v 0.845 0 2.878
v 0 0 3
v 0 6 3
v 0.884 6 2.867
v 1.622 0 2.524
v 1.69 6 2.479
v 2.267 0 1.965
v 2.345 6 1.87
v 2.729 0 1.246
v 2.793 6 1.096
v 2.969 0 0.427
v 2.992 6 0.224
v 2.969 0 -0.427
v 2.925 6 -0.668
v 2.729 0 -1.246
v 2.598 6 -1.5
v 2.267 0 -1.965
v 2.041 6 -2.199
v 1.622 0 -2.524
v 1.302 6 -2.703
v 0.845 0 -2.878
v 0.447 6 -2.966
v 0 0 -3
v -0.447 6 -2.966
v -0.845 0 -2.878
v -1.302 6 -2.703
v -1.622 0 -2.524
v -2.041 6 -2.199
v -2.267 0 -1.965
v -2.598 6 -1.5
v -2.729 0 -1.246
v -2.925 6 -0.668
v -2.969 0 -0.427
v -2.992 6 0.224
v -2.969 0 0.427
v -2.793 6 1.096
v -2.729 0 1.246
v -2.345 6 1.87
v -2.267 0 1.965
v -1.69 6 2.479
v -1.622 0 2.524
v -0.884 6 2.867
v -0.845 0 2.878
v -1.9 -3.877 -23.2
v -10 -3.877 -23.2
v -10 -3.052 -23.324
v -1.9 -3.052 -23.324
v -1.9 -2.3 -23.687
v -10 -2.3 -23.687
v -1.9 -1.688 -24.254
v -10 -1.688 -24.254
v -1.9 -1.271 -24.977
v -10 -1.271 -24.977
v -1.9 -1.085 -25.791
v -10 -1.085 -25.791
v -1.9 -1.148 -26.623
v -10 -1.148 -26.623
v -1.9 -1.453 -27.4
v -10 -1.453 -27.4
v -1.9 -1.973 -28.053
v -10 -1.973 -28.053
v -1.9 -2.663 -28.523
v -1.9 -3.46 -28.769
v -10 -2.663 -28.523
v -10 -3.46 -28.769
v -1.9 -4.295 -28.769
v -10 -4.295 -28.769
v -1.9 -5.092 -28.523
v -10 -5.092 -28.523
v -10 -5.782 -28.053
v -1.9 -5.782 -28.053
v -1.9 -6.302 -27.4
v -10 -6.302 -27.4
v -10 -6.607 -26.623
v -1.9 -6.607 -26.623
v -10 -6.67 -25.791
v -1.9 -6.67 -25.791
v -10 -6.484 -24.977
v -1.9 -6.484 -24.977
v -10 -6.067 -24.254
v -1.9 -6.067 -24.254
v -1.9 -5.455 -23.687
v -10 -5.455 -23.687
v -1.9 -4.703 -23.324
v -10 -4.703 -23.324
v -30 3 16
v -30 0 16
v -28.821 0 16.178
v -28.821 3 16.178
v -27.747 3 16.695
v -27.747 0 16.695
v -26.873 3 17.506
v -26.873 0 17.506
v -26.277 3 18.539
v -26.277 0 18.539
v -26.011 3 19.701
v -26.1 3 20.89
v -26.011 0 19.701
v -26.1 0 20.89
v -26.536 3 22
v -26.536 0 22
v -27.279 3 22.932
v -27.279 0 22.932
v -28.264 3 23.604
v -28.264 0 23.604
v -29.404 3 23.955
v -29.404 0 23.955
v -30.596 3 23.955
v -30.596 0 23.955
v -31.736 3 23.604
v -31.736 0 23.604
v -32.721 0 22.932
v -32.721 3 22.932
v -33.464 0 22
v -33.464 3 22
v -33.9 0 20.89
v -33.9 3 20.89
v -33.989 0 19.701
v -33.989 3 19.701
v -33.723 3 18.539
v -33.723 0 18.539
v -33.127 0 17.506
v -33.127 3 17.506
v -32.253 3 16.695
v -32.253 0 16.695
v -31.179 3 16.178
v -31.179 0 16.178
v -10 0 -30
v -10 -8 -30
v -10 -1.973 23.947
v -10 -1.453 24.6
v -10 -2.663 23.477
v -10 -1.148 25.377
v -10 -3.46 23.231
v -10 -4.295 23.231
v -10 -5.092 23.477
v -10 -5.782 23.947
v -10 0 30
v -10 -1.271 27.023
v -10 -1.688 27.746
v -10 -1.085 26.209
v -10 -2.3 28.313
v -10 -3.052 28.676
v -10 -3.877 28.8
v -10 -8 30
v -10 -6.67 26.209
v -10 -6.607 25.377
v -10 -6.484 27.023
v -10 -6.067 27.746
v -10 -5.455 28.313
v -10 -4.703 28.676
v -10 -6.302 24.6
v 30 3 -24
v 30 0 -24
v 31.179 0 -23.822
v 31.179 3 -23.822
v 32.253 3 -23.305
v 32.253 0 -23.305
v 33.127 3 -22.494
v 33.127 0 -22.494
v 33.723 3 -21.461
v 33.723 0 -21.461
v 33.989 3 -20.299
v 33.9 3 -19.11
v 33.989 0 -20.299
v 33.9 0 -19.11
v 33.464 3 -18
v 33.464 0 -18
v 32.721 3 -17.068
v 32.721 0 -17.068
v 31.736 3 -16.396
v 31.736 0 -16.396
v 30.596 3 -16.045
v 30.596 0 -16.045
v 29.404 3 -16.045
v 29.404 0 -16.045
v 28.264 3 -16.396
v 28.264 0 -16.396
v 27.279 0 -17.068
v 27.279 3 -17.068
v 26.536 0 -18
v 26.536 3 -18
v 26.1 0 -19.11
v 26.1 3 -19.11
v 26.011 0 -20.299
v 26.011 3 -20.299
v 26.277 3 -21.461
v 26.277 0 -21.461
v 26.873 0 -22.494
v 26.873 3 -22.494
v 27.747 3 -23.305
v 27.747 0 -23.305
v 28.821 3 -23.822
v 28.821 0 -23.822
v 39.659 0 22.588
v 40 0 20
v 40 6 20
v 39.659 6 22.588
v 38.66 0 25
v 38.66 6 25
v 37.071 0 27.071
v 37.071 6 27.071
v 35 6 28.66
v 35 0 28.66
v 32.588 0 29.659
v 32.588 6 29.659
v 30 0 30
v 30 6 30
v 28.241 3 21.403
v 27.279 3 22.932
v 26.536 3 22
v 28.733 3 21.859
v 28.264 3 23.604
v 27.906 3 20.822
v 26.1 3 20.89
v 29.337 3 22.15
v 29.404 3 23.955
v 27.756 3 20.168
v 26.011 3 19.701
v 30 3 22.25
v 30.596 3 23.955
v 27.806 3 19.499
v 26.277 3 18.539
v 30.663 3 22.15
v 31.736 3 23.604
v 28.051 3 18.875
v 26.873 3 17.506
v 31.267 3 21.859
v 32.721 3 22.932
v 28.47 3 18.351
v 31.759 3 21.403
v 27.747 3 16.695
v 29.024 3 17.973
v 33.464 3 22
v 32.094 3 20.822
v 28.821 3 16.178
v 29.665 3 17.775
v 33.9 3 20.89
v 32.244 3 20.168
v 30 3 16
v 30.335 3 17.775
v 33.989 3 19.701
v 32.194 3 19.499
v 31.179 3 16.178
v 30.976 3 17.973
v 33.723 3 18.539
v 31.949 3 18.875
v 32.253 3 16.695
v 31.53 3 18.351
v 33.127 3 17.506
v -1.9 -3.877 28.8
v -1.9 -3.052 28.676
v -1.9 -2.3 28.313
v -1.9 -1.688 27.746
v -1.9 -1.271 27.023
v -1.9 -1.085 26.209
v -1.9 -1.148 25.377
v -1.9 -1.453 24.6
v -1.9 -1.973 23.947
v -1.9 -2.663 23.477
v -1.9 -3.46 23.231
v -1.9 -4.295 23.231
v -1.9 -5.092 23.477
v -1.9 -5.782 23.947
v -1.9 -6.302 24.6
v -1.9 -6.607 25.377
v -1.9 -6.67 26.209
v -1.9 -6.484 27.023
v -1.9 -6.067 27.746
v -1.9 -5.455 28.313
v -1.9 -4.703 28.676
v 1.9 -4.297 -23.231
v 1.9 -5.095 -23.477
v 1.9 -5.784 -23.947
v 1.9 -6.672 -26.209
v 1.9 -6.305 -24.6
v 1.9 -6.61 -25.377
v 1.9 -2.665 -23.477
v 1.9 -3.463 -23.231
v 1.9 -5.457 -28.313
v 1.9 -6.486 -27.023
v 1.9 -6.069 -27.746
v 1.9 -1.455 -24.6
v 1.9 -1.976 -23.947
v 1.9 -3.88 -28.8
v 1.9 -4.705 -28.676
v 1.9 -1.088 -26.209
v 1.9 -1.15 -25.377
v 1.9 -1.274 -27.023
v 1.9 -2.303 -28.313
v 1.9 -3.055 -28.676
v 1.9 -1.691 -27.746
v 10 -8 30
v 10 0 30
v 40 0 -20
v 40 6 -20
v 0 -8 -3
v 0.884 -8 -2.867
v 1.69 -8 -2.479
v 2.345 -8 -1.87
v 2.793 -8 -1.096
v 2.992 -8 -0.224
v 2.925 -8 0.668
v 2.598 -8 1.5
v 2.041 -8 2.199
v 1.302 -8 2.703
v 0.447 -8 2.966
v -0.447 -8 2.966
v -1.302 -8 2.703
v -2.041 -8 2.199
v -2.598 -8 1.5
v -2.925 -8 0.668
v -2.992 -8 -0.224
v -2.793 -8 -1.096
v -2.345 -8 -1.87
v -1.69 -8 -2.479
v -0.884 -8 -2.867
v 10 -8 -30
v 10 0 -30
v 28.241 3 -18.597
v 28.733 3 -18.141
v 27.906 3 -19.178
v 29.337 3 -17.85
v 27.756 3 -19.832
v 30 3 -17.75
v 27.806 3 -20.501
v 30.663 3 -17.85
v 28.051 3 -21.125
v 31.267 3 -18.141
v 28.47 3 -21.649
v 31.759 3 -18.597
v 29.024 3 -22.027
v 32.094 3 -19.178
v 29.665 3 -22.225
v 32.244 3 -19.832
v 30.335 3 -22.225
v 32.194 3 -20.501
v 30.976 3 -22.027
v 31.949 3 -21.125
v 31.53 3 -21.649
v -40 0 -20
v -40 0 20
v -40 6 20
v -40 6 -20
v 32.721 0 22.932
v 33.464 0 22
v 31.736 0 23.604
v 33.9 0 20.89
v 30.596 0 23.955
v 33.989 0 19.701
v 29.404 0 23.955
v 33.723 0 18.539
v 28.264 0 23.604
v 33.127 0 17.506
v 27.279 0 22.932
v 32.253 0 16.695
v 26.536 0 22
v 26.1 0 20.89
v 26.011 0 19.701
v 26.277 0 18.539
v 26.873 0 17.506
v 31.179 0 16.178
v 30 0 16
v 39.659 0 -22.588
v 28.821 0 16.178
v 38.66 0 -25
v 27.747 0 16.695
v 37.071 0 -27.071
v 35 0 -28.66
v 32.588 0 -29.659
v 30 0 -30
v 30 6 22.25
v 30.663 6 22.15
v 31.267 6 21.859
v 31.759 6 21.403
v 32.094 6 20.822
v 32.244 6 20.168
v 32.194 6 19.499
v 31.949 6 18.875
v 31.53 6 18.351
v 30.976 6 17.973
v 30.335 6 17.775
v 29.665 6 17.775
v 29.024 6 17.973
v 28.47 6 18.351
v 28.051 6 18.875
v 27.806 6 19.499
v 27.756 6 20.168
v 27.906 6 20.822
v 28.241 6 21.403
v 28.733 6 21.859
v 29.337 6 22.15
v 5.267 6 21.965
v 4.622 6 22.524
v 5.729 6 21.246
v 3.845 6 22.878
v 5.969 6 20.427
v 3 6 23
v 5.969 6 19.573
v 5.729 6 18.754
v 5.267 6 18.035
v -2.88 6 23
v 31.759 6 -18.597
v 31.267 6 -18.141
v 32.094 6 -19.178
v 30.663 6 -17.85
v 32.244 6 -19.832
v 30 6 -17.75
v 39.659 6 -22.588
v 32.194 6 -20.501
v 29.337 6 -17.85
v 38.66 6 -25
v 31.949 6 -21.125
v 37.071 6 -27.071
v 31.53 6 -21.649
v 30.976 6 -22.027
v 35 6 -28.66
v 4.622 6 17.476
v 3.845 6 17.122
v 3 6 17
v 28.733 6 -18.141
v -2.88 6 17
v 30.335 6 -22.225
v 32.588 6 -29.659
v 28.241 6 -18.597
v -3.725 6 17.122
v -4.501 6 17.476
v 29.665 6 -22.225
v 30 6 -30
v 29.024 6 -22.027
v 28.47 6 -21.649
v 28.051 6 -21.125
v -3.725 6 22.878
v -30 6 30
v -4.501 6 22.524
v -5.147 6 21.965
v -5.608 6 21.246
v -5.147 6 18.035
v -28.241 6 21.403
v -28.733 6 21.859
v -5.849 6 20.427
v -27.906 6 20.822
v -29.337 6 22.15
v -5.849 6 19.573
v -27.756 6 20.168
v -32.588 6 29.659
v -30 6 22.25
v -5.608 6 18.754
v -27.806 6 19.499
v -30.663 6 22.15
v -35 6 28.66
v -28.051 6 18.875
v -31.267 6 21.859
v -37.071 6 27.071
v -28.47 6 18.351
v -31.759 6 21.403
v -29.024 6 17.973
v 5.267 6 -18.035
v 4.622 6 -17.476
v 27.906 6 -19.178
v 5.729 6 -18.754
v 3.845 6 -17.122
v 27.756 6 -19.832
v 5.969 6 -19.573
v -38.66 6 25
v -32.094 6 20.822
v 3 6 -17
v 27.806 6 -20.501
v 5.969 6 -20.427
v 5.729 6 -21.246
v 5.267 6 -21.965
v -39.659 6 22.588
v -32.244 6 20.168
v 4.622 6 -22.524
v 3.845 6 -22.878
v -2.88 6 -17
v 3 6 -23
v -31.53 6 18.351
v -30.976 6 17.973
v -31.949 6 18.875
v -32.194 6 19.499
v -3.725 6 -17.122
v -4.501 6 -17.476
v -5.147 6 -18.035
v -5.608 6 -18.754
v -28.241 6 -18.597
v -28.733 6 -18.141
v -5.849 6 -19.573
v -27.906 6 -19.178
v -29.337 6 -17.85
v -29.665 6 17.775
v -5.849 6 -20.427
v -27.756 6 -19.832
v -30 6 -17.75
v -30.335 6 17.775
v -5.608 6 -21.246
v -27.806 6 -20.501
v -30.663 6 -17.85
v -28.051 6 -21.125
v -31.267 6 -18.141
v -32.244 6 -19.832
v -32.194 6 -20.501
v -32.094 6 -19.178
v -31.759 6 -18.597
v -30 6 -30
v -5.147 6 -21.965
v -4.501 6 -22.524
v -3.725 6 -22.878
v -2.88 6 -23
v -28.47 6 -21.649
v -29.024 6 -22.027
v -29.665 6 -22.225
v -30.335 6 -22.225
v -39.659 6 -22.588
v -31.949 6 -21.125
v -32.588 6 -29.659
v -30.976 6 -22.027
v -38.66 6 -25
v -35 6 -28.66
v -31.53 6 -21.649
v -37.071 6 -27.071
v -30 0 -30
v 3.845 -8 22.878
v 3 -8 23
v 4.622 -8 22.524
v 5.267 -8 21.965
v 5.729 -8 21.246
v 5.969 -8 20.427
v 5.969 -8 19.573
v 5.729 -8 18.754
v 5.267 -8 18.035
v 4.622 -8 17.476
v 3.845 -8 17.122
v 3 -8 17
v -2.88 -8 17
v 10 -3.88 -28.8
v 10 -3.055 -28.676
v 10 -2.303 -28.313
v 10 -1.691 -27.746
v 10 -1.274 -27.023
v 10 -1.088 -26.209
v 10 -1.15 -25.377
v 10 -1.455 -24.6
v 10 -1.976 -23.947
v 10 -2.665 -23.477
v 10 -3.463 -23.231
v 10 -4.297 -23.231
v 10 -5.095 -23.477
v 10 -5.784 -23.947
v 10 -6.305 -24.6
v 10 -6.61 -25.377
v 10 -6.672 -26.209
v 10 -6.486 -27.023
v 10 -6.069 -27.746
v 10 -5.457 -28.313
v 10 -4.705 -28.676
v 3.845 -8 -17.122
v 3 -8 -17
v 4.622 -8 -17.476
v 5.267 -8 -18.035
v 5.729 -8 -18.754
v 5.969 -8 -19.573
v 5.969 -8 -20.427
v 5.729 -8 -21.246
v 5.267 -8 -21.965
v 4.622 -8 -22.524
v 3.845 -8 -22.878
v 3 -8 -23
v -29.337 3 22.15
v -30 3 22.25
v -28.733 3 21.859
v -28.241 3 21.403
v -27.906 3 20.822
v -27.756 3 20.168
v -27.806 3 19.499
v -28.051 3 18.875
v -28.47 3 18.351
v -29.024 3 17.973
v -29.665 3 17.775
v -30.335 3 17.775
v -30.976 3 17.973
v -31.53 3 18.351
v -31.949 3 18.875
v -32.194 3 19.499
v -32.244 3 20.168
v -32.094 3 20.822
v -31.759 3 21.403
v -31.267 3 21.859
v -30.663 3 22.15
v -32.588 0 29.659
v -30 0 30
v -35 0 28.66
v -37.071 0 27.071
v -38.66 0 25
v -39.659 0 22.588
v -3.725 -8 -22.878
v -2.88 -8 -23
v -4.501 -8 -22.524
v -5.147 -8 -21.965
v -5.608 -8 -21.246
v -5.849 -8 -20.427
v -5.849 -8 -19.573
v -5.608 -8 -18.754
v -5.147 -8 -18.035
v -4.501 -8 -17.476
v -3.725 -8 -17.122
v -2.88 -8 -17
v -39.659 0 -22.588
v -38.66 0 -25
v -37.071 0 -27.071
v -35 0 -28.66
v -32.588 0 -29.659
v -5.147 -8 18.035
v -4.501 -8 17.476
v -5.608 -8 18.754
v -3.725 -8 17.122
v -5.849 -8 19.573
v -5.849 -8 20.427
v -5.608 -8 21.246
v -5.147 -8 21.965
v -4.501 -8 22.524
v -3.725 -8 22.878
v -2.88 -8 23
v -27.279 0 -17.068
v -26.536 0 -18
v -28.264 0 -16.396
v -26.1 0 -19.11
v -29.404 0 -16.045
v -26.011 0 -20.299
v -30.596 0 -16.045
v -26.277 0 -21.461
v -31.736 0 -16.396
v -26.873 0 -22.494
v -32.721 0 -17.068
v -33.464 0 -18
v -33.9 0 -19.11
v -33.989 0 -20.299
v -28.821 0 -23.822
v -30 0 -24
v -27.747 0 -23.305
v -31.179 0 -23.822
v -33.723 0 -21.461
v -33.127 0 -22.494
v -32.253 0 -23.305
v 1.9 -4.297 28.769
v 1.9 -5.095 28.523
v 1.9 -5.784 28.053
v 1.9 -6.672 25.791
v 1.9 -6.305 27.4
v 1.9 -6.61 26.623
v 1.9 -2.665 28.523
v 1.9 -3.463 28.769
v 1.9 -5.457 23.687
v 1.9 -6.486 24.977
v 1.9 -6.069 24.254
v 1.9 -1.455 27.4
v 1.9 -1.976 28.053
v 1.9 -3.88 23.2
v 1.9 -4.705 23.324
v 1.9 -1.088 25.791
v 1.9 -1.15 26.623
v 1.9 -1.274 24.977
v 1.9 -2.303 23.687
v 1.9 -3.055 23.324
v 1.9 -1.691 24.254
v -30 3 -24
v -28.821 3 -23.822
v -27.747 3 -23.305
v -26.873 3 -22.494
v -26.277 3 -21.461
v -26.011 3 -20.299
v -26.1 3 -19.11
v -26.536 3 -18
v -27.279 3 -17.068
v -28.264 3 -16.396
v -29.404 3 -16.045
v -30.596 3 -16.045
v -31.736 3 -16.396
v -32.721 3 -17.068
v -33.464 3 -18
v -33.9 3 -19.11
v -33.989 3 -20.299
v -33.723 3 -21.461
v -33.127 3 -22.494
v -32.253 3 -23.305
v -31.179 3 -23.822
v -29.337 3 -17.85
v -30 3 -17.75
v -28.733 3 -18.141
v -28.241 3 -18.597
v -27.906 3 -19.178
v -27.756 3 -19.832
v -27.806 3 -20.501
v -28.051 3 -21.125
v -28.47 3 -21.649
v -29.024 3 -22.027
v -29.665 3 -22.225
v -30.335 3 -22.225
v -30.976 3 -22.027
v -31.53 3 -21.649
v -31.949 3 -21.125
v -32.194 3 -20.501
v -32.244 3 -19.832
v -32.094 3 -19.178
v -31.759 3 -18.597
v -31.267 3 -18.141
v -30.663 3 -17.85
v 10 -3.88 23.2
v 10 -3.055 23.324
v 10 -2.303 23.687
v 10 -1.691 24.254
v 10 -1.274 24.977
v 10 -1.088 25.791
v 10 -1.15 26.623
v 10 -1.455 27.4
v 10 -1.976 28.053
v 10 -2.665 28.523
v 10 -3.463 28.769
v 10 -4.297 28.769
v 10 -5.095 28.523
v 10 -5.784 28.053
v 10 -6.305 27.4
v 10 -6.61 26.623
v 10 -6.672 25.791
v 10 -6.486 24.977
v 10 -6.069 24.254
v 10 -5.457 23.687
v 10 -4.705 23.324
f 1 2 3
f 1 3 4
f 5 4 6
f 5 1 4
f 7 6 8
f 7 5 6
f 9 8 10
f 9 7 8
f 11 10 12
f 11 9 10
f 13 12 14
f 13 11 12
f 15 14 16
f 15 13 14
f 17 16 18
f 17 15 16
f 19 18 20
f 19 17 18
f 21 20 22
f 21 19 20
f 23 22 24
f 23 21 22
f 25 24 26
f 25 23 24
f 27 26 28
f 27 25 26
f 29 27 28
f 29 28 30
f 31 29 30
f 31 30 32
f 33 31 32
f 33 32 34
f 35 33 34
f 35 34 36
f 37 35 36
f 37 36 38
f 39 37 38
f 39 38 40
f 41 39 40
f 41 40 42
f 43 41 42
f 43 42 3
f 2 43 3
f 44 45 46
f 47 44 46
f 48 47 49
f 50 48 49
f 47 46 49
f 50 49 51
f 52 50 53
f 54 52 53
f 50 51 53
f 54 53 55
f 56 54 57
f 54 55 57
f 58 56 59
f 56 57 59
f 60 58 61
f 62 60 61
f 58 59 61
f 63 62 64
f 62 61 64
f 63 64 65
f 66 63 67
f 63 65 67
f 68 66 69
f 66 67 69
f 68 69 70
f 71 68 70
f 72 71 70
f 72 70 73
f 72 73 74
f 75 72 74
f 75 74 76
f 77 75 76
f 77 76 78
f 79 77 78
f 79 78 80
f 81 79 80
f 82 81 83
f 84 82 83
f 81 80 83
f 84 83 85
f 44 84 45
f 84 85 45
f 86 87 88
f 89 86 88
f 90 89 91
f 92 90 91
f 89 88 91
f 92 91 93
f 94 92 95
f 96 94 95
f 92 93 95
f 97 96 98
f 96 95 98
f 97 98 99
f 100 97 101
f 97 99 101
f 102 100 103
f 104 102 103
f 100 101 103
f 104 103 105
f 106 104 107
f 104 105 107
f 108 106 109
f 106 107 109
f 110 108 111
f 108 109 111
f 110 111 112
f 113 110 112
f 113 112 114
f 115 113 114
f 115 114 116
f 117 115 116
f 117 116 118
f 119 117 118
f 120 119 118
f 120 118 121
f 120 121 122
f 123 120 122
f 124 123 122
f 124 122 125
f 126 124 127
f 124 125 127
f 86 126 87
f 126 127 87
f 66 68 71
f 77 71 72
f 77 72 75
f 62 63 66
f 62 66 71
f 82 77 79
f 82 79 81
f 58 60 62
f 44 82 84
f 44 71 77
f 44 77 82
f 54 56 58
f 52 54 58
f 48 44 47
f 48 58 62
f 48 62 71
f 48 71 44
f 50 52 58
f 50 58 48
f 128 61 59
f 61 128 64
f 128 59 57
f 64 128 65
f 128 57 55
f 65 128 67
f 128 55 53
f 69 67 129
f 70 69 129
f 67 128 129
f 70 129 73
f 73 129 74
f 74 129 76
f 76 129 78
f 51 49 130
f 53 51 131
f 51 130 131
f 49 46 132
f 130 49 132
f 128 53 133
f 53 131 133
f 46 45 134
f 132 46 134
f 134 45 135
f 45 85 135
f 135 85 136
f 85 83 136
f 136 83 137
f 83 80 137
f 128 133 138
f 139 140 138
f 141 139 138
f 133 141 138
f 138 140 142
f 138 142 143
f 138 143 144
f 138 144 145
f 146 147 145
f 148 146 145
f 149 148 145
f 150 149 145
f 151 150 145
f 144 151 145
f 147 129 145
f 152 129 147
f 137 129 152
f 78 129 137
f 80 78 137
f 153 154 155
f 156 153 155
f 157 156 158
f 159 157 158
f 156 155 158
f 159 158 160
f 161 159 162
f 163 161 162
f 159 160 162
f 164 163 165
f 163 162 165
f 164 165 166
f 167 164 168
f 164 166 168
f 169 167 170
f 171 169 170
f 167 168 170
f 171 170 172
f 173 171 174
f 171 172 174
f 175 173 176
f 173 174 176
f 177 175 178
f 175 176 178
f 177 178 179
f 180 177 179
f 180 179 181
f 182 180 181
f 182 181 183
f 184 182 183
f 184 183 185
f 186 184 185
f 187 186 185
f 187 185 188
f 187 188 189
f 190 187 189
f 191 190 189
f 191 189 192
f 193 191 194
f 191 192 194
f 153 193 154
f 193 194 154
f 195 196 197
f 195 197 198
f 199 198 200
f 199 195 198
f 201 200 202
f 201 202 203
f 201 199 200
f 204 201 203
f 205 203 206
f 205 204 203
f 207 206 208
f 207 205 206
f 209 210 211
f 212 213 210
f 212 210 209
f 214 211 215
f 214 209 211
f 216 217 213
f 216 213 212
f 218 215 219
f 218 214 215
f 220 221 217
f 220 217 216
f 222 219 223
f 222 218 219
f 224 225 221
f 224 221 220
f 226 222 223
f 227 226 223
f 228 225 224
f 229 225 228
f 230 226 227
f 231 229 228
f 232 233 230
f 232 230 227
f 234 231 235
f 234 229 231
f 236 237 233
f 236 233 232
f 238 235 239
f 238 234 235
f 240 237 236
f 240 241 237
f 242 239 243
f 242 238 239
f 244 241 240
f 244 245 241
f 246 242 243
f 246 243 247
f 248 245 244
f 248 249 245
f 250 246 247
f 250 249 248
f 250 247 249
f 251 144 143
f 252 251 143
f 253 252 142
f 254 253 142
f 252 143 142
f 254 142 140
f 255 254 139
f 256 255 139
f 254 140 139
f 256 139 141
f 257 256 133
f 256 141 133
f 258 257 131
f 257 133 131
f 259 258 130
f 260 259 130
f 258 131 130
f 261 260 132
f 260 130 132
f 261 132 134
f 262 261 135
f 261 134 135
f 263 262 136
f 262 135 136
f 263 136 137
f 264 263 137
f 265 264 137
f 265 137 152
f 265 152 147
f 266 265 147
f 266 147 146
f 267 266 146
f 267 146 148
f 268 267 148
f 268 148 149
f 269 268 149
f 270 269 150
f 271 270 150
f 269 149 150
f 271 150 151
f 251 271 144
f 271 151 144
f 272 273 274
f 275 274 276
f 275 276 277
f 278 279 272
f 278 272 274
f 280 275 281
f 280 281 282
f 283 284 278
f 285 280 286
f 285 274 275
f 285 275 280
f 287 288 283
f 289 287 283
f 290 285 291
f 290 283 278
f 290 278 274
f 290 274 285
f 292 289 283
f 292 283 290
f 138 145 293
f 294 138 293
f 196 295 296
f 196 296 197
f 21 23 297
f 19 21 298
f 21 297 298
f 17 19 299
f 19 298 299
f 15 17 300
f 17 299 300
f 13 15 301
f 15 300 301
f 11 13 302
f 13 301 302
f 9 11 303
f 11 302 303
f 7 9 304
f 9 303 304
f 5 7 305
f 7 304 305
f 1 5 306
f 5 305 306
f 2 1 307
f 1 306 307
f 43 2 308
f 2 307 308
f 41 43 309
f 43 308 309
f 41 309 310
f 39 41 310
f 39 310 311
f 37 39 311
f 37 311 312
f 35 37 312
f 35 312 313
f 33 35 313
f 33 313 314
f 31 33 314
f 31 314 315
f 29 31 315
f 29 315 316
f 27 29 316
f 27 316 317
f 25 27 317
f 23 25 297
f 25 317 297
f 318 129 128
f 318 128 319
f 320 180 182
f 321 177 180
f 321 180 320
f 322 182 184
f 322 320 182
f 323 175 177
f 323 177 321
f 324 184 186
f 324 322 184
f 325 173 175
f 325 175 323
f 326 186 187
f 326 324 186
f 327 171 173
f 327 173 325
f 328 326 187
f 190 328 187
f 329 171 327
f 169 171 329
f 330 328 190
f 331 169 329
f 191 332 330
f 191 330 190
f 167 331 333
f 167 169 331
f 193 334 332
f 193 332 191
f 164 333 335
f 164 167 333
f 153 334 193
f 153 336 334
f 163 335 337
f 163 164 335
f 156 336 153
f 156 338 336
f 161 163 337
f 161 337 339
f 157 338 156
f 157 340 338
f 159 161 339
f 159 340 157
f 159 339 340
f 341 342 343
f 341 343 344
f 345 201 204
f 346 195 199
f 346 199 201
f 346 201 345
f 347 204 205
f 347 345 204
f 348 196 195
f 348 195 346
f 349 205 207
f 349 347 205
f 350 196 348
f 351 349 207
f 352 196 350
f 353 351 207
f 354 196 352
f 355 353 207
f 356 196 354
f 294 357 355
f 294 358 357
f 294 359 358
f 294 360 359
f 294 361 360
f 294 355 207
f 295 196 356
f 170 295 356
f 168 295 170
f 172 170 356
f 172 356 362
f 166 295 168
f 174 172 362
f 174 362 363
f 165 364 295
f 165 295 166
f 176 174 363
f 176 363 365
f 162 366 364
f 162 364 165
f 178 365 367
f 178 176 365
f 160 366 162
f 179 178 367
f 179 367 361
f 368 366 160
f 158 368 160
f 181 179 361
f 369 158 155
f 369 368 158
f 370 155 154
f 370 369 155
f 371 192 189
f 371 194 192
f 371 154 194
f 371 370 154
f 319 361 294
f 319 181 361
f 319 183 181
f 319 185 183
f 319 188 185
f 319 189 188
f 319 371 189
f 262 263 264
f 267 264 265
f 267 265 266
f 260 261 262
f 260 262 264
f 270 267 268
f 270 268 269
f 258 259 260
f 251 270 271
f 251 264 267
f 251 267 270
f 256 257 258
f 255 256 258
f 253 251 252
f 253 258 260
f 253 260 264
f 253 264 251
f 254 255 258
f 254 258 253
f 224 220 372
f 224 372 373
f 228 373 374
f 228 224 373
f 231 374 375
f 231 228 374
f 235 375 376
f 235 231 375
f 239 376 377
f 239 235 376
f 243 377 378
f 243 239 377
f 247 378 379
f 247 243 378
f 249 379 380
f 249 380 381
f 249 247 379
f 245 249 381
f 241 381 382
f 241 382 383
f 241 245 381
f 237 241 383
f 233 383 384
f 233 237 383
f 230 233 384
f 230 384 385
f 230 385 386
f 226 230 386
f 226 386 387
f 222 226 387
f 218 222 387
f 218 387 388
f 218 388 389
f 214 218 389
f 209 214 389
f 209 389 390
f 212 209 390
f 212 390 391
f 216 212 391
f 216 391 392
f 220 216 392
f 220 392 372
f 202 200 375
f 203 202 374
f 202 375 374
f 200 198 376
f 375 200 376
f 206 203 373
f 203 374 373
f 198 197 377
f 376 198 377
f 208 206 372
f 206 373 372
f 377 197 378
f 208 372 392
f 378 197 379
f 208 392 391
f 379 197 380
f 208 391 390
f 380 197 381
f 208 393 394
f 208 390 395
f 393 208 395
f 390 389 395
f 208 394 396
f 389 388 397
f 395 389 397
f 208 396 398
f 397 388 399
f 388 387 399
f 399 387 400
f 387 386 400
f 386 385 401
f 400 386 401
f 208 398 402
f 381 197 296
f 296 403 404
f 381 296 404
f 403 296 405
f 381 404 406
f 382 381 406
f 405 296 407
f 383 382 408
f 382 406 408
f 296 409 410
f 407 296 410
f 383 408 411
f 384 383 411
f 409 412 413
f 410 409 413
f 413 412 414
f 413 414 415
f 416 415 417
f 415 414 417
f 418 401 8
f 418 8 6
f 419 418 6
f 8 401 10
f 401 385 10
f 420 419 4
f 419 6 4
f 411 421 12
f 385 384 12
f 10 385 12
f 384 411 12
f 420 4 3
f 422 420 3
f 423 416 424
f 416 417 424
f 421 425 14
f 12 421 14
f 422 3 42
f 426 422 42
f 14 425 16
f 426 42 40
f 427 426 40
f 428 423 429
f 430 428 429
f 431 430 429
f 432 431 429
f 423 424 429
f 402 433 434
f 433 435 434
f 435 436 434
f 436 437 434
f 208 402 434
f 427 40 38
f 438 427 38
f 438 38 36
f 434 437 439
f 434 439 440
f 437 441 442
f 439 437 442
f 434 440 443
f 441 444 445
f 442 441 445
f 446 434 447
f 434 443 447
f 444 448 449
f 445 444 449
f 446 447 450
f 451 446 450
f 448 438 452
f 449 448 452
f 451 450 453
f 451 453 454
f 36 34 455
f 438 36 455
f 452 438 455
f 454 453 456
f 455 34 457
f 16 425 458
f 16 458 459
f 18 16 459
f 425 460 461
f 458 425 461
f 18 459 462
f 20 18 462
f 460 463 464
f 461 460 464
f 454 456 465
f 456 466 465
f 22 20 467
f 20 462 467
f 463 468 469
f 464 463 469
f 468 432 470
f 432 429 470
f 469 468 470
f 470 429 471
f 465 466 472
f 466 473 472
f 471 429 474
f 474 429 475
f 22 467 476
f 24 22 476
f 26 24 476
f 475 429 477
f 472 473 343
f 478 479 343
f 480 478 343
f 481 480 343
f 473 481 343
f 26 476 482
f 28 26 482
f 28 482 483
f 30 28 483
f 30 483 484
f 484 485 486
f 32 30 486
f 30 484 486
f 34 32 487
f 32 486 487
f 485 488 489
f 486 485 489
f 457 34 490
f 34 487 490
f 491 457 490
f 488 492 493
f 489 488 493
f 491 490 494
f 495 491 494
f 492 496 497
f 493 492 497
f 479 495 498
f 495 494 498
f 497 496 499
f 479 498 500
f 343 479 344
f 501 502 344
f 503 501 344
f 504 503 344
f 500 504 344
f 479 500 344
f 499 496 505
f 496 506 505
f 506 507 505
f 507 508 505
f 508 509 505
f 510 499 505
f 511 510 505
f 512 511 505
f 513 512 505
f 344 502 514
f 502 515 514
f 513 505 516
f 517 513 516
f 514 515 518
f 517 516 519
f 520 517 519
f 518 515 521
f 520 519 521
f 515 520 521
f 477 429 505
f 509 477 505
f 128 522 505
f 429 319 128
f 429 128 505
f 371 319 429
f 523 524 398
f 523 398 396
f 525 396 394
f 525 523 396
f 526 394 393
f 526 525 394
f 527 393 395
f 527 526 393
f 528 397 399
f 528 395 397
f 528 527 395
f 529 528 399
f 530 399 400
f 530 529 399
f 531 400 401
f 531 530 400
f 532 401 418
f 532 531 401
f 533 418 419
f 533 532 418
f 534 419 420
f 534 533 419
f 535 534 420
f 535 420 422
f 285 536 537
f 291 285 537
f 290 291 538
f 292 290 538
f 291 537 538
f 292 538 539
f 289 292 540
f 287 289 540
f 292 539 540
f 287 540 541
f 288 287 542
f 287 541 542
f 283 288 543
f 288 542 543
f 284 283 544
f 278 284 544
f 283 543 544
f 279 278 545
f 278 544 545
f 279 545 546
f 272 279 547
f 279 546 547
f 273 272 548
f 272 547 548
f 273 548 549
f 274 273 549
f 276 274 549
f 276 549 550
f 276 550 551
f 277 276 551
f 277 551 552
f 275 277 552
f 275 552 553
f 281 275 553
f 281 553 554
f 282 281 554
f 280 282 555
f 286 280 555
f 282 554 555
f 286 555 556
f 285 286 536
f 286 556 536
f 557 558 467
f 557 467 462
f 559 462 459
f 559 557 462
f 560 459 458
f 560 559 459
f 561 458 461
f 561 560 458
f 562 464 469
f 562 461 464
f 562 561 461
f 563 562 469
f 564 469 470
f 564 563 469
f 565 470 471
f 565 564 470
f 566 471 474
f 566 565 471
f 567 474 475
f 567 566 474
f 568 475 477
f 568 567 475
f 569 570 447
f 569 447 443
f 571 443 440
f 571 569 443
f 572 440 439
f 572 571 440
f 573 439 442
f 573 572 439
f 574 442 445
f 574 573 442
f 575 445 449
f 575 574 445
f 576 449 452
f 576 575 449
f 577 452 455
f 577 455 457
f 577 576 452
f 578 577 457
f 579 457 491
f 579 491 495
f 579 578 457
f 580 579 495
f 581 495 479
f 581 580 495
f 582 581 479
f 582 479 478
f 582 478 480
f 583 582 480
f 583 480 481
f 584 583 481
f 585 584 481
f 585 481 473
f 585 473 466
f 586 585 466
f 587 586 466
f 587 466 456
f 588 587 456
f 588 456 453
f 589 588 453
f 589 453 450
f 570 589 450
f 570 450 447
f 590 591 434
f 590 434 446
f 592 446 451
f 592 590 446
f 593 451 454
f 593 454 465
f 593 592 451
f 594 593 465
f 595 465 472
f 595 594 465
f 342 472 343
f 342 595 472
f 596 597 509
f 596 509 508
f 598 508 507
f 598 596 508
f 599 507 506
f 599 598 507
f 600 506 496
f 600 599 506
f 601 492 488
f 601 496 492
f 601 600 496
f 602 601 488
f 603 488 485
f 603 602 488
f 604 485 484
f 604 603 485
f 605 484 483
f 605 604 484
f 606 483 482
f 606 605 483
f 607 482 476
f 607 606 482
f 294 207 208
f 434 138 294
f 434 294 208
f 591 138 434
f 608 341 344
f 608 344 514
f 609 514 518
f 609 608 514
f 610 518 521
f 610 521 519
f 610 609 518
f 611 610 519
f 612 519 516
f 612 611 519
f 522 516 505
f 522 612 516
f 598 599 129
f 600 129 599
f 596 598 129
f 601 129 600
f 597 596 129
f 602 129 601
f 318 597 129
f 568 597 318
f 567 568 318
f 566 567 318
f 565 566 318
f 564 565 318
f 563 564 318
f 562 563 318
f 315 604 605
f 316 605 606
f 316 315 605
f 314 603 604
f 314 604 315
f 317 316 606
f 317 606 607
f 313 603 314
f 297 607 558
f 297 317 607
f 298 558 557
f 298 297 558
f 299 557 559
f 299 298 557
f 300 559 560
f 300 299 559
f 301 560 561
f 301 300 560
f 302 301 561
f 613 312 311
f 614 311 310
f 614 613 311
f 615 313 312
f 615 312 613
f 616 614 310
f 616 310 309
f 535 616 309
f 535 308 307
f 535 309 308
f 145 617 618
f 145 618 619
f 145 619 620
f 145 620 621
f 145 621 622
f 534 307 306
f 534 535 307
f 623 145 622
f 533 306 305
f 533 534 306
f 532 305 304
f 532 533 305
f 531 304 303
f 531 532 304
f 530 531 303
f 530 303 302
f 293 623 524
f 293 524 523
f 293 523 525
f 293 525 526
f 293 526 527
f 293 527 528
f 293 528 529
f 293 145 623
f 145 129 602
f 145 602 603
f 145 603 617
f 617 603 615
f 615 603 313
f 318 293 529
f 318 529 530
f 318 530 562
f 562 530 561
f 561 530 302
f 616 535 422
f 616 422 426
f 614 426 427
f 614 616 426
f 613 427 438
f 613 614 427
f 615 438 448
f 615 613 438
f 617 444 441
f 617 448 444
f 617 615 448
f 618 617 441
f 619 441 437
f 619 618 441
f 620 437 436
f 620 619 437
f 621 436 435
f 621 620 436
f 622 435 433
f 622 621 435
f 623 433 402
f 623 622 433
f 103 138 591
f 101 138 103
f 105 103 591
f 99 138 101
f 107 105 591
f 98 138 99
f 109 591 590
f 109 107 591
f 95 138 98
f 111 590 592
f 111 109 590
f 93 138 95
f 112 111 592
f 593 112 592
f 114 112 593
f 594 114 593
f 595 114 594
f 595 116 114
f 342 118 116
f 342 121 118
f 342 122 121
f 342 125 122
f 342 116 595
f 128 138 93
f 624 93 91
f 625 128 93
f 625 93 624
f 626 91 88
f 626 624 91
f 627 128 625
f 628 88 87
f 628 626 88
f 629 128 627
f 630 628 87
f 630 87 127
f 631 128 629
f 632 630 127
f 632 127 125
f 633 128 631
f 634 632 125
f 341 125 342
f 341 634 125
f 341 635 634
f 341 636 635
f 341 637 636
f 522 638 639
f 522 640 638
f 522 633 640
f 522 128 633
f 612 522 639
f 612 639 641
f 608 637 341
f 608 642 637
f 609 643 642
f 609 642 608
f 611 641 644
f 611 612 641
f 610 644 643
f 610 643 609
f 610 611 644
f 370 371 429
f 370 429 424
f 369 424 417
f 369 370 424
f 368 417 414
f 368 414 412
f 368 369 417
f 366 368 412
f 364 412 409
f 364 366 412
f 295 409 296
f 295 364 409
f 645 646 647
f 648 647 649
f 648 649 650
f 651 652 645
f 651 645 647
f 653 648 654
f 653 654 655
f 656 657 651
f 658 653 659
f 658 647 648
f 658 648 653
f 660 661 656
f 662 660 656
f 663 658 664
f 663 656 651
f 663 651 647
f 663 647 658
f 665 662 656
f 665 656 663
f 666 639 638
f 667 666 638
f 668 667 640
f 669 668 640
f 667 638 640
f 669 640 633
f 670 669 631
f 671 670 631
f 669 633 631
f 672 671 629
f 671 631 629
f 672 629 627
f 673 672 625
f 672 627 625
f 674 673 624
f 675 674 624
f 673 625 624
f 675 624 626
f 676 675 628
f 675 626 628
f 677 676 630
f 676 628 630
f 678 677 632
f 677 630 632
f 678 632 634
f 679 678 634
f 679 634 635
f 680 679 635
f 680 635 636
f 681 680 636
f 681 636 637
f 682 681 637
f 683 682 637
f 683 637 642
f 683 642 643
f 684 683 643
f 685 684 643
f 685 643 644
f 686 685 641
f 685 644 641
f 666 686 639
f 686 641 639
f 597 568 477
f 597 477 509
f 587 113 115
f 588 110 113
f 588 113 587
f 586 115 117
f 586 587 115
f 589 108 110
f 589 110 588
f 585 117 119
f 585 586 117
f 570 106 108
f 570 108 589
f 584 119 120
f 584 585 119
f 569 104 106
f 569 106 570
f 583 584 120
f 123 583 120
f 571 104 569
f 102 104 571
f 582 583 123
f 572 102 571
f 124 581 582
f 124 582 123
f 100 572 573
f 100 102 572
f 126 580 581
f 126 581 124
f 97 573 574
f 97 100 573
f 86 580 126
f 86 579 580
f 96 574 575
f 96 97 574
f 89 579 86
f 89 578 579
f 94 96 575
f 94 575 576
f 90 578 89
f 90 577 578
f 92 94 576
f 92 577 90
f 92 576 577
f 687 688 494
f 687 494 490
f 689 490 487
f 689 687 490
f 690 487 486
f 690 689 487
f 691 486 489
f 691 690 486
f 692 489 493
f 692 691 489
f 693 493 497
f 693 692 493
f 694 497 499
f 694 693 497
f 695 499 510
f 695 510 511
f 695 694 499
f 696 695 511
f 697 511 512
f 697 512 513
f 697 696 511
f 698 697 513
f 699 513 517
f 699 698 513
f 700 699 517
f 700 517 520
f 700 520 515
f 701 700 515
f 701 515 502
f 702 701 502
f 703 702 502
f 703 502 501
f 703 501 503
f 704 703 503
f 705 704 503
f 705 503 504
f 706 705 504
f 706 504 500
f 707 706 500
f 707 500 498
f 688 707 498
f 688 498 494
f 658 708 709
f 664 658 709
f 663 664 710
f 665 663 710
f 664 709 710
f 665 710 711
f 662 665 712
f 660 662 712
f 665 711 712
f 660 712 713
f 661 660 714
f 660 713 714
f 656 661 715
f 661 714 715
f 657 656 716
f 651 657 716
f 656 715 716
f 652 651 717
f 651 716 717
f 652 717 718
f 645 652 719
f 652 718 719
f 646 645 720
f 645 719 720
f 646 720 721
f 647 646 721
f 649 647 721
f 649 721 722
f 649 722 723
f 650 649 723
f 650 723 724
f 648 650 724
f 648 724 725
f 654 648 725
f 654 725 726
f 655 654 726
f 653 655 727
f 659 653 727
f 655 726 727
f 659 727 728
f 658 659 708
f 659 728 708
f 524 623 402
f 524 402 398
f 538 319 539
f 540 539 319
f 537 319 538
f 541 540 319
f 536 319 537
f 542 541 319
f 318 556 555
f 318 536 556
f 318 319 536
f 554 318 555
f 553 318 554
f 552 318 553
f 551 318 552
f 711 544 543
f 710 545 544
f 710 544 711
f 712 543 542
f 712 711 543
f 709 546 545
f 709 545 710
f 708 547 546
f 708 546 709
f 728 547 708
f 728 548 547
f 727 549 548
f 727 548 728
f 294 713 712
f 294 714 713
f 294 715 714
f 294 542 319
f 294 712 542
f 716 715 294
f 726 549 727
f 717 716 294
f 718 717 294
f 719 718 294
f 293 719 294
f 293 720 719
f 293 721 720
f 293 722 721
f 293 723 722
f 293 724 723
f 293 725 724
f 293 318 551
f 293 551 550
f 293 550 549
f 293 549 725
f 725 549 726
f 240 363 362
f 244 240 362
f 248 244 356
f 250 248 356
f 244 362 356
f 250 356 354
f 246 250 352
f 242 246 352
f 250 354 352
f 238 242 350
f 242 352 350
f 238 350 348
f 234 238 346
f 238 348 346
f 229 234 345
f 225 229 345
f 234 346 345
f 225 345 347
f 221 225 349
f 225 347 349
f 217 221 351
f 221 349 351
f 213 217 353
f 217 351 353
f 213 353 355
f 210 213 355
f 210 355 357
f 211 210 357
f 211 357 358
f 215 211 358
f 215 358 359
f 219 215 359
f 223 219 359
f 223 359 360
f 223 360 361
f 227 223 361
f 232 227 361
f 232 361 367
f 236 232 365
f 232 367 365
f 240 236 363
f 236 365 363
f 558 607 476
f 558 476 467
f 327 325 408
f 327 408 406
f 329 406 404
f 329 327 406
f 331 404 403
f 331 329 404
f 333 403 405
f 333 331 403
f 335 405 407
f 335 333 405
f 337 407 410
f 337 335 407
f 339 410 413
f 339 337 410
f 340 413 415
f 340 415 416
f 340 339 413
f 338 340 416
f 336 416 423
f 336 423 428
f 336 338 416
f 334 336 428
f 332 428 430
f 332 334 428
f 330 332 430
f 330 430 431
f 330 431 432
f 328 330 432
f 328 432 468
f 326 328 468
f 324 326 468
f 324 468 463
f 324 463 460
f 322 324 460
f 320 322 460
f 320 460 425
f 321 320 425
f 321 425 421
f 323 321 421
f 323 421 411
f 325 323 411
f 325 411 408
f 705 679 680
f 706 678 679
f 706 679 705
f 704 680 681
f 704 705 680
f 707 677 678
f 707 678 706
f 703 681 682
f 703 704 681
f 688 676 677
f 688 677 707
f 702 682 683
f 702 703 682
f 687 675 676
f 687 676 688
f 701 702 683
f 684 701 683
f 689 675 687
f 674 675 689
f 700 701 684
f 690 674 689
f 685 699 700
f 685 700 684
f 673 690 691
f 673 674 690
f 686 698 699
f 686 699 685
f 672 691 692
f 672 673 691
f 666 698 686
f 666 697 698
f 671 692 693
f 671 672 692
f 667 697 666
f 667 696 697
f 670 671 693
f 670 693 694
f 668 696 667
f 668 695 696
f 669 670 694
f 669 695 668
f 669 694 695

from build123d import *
from build123d.topology import SkipClean

# Parameters (mm, degrees)
ESQUISSE1_R              = 3
ESQUISSE1_R_2            = 2.25
BOSS_EXTRU_3_DEPTH       = 6
BOSS_EXTRU_4_START       = 8
ESQUISSE2_W              = 20
ESQUISSE2_H              = 60
ESQUISSE2_R              = 3
BOSS_EXTRU_4_DEPTH       = 8
ESQUISSE3_R              = 4
ENL_V_MAT_EXTRU_2_DEPTH  = 3
ESQUISSE7_R              = 2.8
ENL_V_MAT_EXTRU_8_DEPTH  = 8.1
ENL_V_MAT_EXTRU_9_DEPTH  = 52.923019943
ESQUISSE9_R              = 2.8
ENL_V_MAT_EXTRU_10_DEPTH = 8.1


with BuildPart() as part:
    # Esquisse1 → Boss.-Extru.3 (new body)
    with BuildSketch(Plane(origin=(0, 0, 0), x_dir=(1, 0, 0), z_dir=(0, 1, 0))):
        with BuildLine():
            ThreePointArc((30, 30), (37.071067812, 27.071067812), (40, 20))
            Line((40, 20), (40, -20))
            ThreePointArc((40, -20), (37.071067812, -27.071067812), (30, -30))
            Line((30, -30), (-30, -30))
            ThreePointArc((-30, -30), (-37.071067812, -27.071067812), (-40, -20))
            Line((-40, -20), (-40, 20))
            ThreePointArc((-40, 20), (-37.071067812, 27.071067812), (-30, 30))
            Line((-30, 30), (30, 30))
        make_face()
        with Locations(Location((0, 0, 0), (0, 0, 270))):
            Circle(ESQUISSE1_R, mode=Mode.SUBTRACT)
        with Locations(Location((30, -20, 0), (0, 0, 270))):
            Circle(ESQUISSE1_R_2, mode=Mode.SUBTRACT)
        with Locations(Location((-30, -20, 0), (0, 0, 270))):
            Circle(ESQUISSE1_R_2, mode=Mode.SUBTRACT)
        with Locations(Location((30, 20, 0), (0, 0, 270))):
            Circle(ESQUISSE1_R_2, mode=Mode.SUBTRACT)
        with Locations(Location((-30, 20, 0), (0, 0, 270))):
            Circle(ESQUISSE1_R_2, mode=Mode.SUBTRACT)
    extrude(amount=BOSS_EXTRU_3_DEPTH)

    # Esquisse2 → Boss.-Extru.4 (add)
    with SkipClean():  # the faces are left unmerged after this step: merging them gives an invalid solid
        with BuildSketch(Plane.XZ.offset(BOSS_EXTRU_4_START)):
            Rectangle(ESQUISSE2_W, ESQUISSE2_H)
            with Locations(Location((0, 0, 0), (0, 0, 270))):
                Circle(ESQUISSE2_R, mode=Mode.SUBTRACT)
        extrude(amount=-BOSS_EXTRU_4_DEPTH)

    # Esquisse3 → Enlèv. mat.-Extru.2 (cut)
    with SkipClean():  # the faces are left unmerged after this step: merging them gives an invalid solid
        with BuildSketch(Plane.XZ):
            with Locations(Location((-30, 20, 0), (0, 0, 270))):
                Circle(ESQUISSE3_R)
            with Locations(Location((-30, -20, 0), (0, 0, 270))):
                Circle(ESQUISSE3_R)
            with Locations(Location((30, 20, 0), (0, 0, 270))):
                Circle(ESQUISSE3_R)
            with Locations(Location((30, -20, 0), (0, 0, 270))):
                Circle(ESQUISSE3_R)
        extrude(amount=-ENL_V_MAT_EXTRU_2_DEPTH, mode=Mode.SUBTRACT)

    # Esquisse7 → Enlèv. mat.-Extru.8 (cut)
    with SkipClean():  # the faces are left unmerged after this step: merging them gives an invalid solid
        with BuildSketch(Plane.ZY.offset(10)):
            with Locations((26, -3.87740141)):
                Circle(ESQUISSE7_R)
            with Locations((-26, -3.87740141)):
                Circle(ESQUISSE7_R)
        extrude(amount=-ENL_V_MAT_EXTRU_8_DEPTH, mode=Mode.SUBTRACT)

    # Esquisse8 → Enlèv. mat.-Extru.9 (cut, through all)
    with SkipClean():  # the faces are left unmerged after this step: merging them gives an invalid solid
        with BuildSketch(Plane.XZ.offset(8)):
            with BuildLine():
                Line((-2.879526134, 23), (3, 23))
                ThreePointArc((3, 23), (6, 20), (3, 17))
                Line((3, 17), (-2.879526134, 17))
                ThreePointArc((-2.879526134, 17), (-5.879526134, 20), (-2.879526134, 23))
            make_face()
            with BuildLine():
                Line((-2.879526134, -17), (3, -17))
                ThreePointArc((3, -17), (6, -20), (3, -23))
                Line((3, -23), (-2.879526134, -23))
                ThreePointArc((-2.879526134, -23), (-5.879526134, -20), (-2.879526134, -17))
            make_face()
        extrude(amount=-ENL_V_MAT_EXTRU_9_DEPTH, mode=Mode.SUBTRACT)

    # Esquisse9 → Enlèv. mat.-Extru.10 (cut)
    with SkipClean():  # the faces are left unmerged after this step: merging them gives an invalid solid
        with BuildSketch(Plane(origin=(10, 0, 0), x_dir=(0, 0, -1), z_dir=(1, 0, 0))):
            with Locations((-26, -3.88)):
                Circle(ESQUISSE9_R)
            with Locations((26, -3.88)):
                Circle(ESQUISSE9_R)
        extrude(amount=-ENL_V_MAT_EXTRU_10_DEPTH, mode=Mode.SUBTRACT)


solid = part.part
